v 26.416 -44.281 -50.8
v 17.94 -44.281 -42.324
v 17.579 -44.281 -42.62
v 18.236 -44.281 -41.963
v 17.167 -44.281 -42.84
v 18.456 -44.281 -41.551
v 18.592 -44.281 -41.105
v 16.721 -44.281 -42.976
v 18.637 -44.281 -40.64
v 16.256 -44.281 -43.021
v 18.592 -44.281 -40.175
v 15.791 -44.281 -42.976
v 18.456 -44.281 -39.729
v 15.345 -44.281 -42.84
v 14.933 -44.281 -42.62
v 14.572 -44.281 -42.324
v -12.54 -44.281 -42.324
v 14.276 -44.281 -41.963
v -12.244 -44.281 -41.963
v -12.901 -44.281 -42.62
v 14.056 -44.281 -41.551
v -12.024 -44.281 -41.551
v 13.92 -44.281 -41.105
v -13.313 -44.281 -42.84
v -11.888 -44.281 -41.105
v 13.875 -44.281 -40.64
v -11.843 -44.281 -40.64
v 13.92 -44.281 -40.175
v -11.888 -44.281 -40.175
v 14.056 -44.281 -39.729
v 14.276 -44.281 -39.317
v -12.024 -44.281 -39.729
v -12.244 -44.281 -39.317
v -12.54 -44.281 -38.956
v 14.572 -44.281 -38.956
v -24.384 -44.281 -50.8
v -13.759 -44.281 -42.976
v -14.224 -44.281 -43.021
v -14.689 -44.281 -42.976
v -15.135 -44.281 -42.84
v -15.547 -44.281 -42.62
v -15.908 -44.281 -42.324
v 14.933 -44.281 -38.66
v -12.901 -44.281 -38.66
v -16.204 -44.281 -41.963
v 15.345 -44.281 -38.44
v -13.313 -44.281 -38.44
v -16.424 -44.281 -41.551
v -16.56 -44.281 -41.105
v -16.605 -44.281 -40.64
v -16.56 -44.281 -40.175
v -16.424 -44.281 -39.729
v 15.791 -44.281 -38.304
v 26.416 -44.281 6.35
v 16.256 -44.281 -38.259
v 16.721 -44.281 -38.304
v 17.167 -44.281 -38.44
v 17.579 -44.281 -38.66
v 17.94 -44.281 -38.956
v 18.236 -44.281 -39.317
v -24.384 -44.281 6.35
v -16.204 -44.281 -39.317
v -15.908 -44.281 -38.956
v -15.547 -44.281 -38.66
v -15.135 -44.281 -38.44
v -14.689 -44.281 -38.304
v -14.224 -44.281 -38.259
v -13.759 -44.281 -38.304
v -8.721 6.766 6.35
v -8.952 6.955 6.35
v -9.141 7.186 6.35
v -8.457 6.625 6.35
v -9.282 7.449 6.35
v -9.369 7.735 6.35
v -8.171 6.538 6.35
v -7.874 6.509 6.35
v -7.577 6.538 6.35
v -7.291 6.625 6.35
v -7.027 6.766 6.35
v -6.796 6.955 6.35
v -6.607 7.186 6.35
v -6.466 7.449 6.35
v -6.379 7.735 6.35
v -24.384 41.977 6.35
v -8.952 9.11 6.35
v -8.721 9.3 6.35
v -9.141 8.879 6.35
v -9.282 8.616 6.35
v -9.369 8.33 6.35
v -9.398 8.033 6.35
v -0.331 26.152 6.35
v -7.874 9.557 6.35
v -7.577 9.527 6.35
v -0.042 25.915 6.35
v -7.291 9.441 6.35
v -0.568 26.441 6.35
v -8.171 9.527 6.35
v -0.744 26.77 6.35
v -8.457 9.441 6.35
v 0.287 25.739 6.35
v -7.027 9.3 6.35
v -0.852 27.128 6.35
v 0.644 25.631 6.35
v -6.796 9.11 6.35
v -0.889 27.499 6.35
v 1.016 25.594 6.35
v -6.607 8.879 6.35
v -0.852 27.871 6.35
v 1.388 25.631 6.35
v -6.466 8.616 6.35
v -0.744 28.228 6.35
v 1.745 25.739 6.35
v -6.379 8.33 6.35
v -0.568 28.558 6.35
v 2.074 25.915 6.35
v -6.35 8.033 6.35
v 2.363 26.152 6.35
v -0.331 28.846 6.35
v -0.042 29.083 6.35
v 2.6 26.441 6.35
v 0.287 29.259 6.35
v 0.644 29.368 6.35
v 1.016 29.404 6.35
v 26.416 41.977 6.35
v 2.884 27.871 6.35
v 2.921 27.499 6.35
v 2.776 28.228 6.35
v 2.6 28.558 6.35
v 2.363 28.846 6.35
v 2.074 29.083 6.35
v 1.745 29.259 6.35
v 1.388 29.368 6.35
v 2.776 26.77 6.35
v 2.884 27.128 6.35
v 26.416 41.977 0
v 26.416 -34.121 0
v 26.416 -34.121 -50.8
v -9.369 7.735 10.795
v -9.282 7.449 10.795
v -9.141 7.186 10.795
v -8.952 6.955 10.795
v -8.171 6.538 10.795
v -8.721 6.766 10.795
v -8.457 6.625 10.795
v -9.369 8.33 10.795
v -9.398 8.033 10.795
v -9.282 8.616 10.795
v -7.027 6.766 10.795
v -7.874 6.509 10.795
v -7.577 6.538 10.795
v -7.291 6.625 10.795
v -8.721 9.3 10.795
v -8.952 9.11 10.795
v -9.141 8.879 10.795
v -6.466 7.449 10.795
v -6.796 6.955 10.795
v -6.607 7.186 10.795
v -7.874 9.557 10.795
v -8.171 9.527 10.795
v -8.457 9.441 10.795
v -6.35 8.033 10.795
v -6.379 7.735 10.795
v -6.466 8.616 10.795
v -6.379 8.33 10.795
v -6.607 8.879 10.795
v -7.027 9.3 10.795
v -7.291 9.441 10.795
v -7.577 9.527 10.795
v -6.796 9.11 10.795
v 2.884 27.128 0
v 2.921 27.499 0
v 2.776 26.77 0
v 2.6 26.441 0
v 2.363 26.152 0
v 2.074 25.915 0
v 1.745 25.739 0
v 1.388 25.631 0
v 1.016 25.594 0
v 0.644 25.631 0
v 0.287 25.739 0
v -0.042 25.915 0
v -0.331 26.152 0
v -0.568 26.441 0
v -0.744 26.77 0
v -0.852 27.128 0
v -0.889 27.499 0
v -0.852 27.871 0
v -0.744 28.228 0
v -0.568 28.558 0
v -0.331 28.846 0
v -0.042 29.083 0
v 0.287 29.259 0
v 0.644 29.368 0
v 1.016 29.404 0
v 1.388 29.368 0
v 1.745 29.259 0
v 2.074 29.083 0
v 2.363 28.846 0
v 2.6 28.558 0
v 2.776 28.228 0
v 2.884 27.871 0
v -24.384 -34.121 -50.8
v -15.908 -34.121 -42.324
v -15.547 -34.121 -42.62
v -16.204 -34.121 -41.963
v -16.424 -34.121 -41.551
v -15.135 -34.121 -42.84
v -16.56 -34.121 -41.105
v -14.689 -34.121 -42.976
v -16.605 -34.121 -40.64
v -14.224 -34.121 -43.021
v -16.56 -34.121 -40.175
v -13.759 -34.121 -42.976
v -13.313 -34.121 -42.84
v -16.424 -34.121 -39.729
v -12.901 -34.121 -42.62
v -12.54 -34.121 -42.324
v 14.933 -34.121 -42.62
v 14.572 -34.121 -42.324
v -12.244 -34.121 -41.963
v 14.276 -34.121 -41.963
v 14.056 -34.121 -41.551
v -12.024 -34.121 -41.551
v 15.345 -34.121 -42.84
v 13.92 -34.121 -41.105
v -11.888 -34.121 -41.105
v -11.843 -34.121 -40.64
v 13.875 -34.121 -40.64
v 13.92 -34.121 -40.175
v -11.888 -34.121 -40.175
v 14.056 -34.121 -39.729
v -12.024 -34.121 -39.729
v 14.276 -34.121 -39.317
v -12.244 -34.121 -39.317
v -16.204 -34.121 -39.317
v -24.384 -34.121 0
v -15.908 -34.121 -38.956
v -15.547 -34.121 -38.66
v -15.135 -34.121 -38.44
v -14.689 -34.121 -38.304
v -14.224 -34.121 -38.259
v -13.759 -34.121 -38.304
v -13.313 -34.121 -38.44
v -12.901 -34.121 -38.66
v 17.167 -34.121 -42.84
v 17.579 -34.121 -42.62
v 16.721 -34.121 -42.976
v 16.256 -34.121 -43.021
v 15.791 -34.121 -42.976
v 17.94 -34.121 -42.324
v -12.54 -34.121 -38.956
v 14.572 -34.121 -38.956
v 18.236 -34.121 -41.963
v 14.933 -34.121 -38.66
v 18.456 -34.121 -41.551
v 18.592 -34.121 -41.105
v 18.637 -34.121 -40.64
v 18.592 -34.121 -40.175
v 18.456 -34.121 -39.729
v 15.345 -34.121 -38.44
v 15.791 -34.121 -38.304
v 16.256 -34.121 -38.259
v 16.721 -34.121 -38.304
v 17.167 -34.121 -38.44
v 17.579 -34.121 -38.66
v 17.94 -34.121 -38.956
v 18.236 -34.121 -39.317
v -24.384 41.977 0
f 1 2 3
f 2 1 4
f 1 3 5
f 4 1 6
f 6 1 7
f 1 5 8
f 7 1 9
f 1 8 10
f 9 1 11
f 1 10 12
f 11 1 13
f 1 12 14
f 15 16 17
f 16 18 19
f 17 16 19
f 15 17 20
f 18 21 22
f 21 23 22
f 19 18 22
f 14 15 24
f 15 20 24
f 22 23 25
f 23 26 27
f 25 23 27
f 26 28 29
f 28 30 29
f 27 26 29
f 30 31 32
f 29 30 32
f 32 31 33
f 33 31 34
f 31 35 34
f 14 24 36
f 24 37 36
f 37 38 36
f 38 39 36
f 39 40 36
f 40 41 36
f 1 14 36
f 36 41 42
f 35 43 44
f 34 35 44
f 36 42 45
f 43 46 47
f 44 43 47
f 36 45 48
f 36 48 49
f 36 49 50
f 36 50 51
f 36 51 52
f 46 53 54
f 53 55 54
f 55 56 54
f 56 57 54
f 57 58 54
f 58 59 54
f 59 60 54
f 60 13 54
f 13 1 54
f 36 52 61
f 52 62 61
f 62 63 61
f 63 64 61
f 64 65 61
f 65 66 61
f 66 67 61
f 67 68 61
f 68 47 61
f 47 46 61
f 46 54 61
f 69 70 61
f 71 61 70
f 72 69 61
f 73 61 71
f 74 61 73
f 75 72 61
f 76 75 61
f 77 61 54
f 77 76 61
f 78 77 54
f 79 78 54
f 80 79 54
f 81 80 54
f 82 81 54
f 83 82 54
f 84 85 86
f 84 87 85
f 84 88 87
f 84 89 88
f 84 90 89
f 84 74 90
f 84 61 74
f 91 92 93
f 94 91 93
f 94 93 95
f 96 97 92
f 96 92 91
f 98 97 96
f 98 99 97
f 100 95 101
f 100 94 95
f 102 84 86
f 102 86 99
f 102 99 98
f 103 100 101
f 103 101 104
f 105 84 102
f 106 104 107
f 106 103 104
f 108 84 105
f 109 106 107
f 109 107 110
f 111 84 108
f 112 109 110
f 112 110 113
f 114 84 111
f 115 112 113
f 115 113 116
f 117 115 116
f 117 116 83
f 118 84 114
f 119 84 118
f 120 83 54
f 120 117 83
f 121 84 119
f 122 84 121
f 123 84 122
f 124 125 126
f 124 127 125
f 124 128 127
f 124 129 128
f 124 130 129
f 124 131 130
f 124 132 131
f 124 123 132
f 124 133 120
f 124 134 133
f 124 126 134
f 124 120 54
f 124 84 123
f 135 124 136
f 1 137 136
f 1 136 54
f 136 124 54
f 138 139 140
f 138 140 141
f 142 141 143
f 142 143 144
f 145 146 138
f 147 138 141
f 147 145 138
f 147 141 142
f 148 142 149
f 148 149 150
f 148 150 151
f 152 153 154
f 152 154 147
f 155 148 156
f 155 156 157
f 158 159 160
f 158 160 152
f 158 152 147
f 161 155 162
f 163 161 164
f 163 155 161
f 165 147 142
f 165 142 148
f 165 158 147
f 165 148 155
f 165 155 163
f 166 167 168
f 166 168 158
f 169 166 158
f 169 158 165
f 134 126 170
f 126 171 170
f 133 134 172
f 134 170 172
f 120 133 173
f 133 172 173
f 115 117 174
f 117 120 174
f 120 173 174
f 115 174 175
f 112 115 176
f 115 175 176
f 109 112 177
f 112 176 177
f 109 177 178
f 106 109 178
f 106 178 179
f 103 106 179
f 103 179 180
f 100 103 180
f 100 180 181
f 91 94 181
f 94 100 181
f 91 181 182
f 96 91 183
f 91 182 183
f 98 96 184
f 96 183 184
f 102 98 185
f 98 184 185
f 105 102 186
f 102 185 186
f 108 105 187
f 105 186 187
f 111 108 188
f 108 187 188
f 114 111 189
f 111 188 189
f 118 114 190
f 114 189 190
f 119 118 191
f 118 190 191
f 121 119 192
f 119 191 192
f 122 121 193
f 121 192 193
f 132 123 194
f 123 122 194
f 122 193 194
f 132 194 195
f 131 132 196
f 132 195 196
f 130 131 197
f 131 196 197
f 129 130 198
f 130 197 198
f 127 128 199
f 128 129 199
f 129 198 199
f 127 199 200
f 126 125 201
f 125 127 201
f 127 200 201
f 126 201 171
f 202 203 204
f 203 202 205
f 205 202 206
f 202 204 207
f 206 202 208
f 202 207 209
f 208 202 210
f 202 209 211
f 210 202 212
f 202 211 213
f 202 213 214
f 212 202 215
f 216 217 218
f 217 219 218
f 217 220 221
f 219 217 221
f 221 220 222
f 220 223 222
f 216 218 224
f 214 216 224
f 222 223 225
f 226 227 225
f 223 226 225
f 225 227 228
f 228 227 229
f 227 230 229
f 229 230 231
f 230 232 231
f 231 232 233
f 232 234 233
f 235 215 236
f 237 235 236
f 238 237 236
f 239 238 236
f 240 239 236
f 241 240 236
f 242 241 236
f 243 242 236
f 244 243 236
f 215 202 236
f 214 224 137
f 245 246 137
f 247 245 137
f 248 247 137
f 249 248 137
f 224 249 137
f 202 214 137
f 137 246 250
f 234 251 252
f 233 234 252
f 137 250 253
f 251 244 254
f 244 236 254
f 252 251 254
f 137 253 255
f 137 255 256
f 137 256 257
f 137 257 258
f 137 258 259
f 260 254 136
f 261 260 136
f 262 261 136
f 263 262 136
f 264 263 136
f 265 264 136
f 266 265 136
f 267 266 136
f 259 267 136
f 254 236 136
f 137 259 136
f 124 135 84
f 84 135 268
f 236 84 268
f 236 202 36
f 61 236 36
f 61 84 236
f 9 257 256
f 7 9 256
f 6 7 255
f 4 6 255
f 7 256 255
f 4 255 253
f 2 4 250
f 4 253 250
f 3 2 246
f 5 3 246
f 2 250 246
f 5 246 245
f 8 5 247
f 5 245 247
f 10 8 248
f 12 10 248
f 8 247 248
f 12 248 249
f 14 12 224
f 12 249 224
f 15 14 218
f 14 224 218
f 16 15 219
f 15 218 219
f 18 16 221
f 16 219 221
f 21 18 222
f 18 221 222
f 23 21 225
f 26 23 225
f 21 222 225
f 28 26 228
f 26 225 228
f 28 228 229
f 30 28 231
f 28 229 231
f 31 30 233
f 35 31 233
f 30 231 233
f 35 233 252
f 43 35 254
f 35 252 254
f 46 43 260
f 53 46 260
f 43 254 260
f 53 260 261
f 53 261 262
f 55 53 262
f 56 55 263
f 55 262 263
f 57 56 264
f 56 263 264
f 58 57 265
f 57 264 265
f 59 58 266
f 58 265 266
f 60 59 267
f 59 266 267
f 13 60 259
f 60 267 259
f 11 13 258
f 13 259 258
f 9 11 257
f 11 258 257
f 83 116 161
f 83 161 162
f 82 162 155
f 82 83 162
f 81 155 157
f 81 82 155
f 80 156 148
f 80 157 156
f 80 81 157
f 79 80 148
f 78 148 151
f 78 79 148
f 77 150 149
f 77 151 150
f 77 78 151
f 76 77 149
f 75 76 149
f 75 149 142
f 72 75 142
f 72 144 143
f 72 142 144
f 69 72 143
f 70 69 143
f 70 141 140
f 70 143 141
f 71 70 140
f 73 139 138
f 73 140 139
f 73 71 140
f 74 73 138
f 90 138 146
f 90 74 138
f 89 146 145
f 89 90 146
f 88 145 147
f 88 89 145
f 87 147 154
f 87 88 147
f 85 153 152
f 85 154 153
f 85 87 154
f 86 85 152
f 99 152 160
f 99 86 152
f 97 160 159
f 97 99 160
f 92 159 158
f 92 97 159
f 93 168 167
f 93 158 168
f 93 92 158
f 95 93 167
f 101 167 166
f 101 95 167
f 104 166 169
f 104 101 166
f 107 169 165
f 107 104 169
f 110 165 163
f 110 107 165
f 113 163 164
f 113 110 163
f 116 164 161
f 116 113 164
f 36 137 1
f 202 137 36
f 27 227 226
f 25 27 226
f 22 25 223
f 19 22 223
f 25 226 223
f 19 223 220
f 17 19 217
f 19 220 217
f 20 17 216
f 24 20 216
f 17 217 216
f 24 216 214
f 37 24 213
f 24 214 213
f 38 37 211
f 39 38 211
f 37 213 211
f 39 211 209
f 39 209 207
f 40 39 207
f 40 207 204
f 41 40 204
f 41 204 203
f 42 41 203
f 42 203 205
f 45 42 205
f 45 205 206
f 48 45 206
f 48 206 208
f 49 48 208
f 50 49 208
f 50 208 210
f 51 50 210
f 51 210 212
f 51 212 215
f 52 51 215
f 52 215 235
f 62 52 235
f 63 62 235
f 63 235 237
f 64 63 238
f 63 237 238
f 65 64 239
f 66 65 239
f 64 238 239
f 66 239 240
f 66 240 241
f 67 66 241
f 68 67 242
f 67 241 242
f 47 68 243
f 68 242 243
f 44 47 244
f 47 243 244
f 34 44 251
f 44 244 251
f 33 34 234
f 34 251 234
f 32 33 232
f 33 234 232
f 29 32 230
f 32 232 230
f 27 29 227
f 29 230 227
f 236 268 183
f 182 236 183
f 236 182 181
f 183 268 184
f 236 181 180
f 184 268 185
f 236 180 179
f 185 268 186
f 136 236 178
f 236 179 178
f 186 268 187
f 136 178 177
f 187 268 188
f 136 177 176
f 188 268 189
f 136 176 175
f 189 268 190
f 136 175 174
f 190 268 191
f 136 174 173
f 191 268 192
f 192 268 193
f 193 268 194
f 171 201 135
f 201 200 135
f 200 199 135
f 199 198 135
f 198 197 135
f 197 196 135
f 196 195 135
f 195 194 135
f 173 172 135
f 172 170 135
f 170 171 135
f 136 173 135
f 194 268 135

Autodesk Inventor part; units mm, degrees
ref_plane "YZ Plane" through (0, 0, 0) normal (1, 0, 0) x (0, 1, 0)
ref_plane "XZ Plane" through (0, 0, 0) normal (0, 1, 0) x (-1, 0, 0)
ref_plane "XY Plane" through (0, 0, 0) normal (0, 0, 1) x (1, 0, 0)
sketch "Sketch1" plane through (0, 0, 0) normal (0, 0, 1) x (1, 0, 0)
  circle A0 centre (1.016, 27.4993) radius 1.905
  arc A1 (-3.2174, 19.2546) -> (-0.4706, 18.1168) centre (1.016, 25.5904) ccw
  circle A2 centre (1.016, 25.5904) radius 7.62
  arc A3 (-0.4706, -2.0514) -> (-3.2174, -3.1892) centre (1.016, -9.525) ccw
  arc A4 (2.5026, -16.9986) -> (5.2494, -15.8608) centre (1.016, -9.525) ccw
  circle A5 centre (1.016, -9.525) radius 7.62
  line L0 (1.016, -1.905) -> (1.016, 17.9704)
  circle A6 centre (1.016, 8.0327) radius 9.525
  line L1 (0, 16.0654) -> (2.032, 16.0654)
  line L2 (2.032, 0) -> (0, 0)
  circle A7 centre (-7.874, 8.0327) radius 9.525
  line L3 (26.416, 41.9773) -> (-24.384, 41.9773)
  line L4 (-24.384, -44.2811) -> (-24.384, 41.9773)
  line L5 (26.416, -44.2811) -> (26.416, 41.9773)
  line L6 (-75.184, -44.2811) -> (77.216, -44.2811)
  line L7 (1.016, 8.0327) -> (-47.2731, 8.0327)
  circle A8 centre (-24.384, 8.0327) radius 21.5247
  circle A9 centre (1.016, -9.525) radius 1.905
  circle A10 centre (-7.874, 8.0327) radius 1.905
  point P0 (0, 0)
  dimension "d0" = 19.05
  dimension "d1" = 19.05
  dimension "d2" = 8.89
  dimension "d3" = 3.81
  dimension "d4" = 3.81
  dimension "d5" = 3.81
  dimension "d32" = 71.7804
  dimension "d33" = 44.2811
  dimension "d34" = 25.4
  dimension "d35" = 0
  dimension "d36" = 0
  dimension "d37" = 86.2584
extrude "Extrusion1" add sketch "Sketch1" along normal blind 6.35 contours A2 A1 | A5 A4 A3 | A6 A7 A8 L4 L3 L5 L6 | A7 A8 A6 | A6 A8 L7 L0 A7 | L0 A7 | A8 A7 L7 A10 A6 | A6 A10 L7 A8 | A8 L4 L7 A7 | L7 A8 A6 A7 L0 | L7 A10 A6 A8 | L7 L4 A8 A7 | A7 A8 A6 A10 L7 | A6 A8 A7 | A9
sketch "Sketch2" plane through (0, 0, 6.35) normal (0, 0, 1) x (1, 0, 0)
  line L0 (-3.429, -3.0002) -> (13.2364, -3.0002)
  line L1 (13.2364, -3.0002) -> (13.2364, 18.7074)
  line L2 (13.2364, 18.7074) -> (-3.429, 18.7074)
  line L3 (-3.429, 18.7074) -> (-3.429, -3.0002)
  point P0 (0, 0)
extrude "Extrusion2" add sketch "Sketch2" against normal blind 6.35
sketch "Sketch3" plane through (0, 0, 0) normal (0, 0, -1) x (-1, 0, 0)
  line L0 (24.384, 41.9773) -> (24.384, -44.2811) projected
  line L1 (-26.416, -44.2811) -> (24.384, -44.2811)
  line L2 (24.384, -44.2811) -> (24.384, -34.1211)
  line L3 (24.384, -34.1211) -> (-26.416, -34.1211)
  line L4 (-26.416, -34.1211) -> (-26.416, -44.2811)
  point P0 (0, 0)
  dimension "d10" = 10.16
extrude "Extrusion3" add sketch "Sketch3" along normal blind 50.8
sketch "Sketch4" plane through (-24.384, -34.1211, 0) normal (0, 1, 0) x (1, 0, 0)
  circle A0 centre (40.64, 40.64) radius 2.3813
  circle A1 centre (10.16, 40.64) radius 2.3813
  line L0 (50.8, 0) -> (0, 0)
  line L1 (0, 50.8) -> (50.8, 50.8) projected
  line L2 (50.8, 0) -> (50.8, 50.8) projected
  line L3 (0, 0) -> (0, 50.8) projected
  point P0 (24.384, 0)
  dimension "d13" = 4.7625
  dimension "d14" = 4.7625
  dimension "d17" = 10.16
  dimension "d18" = 10.16
  dimension "d19" = 10.16
  dimension "d20" = 10.16
extrude "Extrusion4" cut sketch "Sketch4" against normal up to next contours A0 | A1
sketch "Sketch5" plane through (0, 0, 6.35) normal (0, 0, 1) x (1, 0, 0)
  circle A0 centre (-7.874, 8.0327) radius 1.905 projected
  point P0 (0, 0)
extrude "Extrusion5" add sketch "Sketch5" against normal blind 6.35
sketch "Sketch6" plane through (0, 0, 6.35) normal (0, 0, 1) x (1, 0, 0)
  circle A0 centre (-7.874, 8.0327) radius 1.524
  point P0 (0, 0)
  dimension "d27" = 3.048
  dimension "d28" = 8.0327
  dimension "d29" = 7.874
extrude "Extrusion6" add sketch "Sketch6" along normal blind 4.445
properties part number "Middle Gear Frame"
